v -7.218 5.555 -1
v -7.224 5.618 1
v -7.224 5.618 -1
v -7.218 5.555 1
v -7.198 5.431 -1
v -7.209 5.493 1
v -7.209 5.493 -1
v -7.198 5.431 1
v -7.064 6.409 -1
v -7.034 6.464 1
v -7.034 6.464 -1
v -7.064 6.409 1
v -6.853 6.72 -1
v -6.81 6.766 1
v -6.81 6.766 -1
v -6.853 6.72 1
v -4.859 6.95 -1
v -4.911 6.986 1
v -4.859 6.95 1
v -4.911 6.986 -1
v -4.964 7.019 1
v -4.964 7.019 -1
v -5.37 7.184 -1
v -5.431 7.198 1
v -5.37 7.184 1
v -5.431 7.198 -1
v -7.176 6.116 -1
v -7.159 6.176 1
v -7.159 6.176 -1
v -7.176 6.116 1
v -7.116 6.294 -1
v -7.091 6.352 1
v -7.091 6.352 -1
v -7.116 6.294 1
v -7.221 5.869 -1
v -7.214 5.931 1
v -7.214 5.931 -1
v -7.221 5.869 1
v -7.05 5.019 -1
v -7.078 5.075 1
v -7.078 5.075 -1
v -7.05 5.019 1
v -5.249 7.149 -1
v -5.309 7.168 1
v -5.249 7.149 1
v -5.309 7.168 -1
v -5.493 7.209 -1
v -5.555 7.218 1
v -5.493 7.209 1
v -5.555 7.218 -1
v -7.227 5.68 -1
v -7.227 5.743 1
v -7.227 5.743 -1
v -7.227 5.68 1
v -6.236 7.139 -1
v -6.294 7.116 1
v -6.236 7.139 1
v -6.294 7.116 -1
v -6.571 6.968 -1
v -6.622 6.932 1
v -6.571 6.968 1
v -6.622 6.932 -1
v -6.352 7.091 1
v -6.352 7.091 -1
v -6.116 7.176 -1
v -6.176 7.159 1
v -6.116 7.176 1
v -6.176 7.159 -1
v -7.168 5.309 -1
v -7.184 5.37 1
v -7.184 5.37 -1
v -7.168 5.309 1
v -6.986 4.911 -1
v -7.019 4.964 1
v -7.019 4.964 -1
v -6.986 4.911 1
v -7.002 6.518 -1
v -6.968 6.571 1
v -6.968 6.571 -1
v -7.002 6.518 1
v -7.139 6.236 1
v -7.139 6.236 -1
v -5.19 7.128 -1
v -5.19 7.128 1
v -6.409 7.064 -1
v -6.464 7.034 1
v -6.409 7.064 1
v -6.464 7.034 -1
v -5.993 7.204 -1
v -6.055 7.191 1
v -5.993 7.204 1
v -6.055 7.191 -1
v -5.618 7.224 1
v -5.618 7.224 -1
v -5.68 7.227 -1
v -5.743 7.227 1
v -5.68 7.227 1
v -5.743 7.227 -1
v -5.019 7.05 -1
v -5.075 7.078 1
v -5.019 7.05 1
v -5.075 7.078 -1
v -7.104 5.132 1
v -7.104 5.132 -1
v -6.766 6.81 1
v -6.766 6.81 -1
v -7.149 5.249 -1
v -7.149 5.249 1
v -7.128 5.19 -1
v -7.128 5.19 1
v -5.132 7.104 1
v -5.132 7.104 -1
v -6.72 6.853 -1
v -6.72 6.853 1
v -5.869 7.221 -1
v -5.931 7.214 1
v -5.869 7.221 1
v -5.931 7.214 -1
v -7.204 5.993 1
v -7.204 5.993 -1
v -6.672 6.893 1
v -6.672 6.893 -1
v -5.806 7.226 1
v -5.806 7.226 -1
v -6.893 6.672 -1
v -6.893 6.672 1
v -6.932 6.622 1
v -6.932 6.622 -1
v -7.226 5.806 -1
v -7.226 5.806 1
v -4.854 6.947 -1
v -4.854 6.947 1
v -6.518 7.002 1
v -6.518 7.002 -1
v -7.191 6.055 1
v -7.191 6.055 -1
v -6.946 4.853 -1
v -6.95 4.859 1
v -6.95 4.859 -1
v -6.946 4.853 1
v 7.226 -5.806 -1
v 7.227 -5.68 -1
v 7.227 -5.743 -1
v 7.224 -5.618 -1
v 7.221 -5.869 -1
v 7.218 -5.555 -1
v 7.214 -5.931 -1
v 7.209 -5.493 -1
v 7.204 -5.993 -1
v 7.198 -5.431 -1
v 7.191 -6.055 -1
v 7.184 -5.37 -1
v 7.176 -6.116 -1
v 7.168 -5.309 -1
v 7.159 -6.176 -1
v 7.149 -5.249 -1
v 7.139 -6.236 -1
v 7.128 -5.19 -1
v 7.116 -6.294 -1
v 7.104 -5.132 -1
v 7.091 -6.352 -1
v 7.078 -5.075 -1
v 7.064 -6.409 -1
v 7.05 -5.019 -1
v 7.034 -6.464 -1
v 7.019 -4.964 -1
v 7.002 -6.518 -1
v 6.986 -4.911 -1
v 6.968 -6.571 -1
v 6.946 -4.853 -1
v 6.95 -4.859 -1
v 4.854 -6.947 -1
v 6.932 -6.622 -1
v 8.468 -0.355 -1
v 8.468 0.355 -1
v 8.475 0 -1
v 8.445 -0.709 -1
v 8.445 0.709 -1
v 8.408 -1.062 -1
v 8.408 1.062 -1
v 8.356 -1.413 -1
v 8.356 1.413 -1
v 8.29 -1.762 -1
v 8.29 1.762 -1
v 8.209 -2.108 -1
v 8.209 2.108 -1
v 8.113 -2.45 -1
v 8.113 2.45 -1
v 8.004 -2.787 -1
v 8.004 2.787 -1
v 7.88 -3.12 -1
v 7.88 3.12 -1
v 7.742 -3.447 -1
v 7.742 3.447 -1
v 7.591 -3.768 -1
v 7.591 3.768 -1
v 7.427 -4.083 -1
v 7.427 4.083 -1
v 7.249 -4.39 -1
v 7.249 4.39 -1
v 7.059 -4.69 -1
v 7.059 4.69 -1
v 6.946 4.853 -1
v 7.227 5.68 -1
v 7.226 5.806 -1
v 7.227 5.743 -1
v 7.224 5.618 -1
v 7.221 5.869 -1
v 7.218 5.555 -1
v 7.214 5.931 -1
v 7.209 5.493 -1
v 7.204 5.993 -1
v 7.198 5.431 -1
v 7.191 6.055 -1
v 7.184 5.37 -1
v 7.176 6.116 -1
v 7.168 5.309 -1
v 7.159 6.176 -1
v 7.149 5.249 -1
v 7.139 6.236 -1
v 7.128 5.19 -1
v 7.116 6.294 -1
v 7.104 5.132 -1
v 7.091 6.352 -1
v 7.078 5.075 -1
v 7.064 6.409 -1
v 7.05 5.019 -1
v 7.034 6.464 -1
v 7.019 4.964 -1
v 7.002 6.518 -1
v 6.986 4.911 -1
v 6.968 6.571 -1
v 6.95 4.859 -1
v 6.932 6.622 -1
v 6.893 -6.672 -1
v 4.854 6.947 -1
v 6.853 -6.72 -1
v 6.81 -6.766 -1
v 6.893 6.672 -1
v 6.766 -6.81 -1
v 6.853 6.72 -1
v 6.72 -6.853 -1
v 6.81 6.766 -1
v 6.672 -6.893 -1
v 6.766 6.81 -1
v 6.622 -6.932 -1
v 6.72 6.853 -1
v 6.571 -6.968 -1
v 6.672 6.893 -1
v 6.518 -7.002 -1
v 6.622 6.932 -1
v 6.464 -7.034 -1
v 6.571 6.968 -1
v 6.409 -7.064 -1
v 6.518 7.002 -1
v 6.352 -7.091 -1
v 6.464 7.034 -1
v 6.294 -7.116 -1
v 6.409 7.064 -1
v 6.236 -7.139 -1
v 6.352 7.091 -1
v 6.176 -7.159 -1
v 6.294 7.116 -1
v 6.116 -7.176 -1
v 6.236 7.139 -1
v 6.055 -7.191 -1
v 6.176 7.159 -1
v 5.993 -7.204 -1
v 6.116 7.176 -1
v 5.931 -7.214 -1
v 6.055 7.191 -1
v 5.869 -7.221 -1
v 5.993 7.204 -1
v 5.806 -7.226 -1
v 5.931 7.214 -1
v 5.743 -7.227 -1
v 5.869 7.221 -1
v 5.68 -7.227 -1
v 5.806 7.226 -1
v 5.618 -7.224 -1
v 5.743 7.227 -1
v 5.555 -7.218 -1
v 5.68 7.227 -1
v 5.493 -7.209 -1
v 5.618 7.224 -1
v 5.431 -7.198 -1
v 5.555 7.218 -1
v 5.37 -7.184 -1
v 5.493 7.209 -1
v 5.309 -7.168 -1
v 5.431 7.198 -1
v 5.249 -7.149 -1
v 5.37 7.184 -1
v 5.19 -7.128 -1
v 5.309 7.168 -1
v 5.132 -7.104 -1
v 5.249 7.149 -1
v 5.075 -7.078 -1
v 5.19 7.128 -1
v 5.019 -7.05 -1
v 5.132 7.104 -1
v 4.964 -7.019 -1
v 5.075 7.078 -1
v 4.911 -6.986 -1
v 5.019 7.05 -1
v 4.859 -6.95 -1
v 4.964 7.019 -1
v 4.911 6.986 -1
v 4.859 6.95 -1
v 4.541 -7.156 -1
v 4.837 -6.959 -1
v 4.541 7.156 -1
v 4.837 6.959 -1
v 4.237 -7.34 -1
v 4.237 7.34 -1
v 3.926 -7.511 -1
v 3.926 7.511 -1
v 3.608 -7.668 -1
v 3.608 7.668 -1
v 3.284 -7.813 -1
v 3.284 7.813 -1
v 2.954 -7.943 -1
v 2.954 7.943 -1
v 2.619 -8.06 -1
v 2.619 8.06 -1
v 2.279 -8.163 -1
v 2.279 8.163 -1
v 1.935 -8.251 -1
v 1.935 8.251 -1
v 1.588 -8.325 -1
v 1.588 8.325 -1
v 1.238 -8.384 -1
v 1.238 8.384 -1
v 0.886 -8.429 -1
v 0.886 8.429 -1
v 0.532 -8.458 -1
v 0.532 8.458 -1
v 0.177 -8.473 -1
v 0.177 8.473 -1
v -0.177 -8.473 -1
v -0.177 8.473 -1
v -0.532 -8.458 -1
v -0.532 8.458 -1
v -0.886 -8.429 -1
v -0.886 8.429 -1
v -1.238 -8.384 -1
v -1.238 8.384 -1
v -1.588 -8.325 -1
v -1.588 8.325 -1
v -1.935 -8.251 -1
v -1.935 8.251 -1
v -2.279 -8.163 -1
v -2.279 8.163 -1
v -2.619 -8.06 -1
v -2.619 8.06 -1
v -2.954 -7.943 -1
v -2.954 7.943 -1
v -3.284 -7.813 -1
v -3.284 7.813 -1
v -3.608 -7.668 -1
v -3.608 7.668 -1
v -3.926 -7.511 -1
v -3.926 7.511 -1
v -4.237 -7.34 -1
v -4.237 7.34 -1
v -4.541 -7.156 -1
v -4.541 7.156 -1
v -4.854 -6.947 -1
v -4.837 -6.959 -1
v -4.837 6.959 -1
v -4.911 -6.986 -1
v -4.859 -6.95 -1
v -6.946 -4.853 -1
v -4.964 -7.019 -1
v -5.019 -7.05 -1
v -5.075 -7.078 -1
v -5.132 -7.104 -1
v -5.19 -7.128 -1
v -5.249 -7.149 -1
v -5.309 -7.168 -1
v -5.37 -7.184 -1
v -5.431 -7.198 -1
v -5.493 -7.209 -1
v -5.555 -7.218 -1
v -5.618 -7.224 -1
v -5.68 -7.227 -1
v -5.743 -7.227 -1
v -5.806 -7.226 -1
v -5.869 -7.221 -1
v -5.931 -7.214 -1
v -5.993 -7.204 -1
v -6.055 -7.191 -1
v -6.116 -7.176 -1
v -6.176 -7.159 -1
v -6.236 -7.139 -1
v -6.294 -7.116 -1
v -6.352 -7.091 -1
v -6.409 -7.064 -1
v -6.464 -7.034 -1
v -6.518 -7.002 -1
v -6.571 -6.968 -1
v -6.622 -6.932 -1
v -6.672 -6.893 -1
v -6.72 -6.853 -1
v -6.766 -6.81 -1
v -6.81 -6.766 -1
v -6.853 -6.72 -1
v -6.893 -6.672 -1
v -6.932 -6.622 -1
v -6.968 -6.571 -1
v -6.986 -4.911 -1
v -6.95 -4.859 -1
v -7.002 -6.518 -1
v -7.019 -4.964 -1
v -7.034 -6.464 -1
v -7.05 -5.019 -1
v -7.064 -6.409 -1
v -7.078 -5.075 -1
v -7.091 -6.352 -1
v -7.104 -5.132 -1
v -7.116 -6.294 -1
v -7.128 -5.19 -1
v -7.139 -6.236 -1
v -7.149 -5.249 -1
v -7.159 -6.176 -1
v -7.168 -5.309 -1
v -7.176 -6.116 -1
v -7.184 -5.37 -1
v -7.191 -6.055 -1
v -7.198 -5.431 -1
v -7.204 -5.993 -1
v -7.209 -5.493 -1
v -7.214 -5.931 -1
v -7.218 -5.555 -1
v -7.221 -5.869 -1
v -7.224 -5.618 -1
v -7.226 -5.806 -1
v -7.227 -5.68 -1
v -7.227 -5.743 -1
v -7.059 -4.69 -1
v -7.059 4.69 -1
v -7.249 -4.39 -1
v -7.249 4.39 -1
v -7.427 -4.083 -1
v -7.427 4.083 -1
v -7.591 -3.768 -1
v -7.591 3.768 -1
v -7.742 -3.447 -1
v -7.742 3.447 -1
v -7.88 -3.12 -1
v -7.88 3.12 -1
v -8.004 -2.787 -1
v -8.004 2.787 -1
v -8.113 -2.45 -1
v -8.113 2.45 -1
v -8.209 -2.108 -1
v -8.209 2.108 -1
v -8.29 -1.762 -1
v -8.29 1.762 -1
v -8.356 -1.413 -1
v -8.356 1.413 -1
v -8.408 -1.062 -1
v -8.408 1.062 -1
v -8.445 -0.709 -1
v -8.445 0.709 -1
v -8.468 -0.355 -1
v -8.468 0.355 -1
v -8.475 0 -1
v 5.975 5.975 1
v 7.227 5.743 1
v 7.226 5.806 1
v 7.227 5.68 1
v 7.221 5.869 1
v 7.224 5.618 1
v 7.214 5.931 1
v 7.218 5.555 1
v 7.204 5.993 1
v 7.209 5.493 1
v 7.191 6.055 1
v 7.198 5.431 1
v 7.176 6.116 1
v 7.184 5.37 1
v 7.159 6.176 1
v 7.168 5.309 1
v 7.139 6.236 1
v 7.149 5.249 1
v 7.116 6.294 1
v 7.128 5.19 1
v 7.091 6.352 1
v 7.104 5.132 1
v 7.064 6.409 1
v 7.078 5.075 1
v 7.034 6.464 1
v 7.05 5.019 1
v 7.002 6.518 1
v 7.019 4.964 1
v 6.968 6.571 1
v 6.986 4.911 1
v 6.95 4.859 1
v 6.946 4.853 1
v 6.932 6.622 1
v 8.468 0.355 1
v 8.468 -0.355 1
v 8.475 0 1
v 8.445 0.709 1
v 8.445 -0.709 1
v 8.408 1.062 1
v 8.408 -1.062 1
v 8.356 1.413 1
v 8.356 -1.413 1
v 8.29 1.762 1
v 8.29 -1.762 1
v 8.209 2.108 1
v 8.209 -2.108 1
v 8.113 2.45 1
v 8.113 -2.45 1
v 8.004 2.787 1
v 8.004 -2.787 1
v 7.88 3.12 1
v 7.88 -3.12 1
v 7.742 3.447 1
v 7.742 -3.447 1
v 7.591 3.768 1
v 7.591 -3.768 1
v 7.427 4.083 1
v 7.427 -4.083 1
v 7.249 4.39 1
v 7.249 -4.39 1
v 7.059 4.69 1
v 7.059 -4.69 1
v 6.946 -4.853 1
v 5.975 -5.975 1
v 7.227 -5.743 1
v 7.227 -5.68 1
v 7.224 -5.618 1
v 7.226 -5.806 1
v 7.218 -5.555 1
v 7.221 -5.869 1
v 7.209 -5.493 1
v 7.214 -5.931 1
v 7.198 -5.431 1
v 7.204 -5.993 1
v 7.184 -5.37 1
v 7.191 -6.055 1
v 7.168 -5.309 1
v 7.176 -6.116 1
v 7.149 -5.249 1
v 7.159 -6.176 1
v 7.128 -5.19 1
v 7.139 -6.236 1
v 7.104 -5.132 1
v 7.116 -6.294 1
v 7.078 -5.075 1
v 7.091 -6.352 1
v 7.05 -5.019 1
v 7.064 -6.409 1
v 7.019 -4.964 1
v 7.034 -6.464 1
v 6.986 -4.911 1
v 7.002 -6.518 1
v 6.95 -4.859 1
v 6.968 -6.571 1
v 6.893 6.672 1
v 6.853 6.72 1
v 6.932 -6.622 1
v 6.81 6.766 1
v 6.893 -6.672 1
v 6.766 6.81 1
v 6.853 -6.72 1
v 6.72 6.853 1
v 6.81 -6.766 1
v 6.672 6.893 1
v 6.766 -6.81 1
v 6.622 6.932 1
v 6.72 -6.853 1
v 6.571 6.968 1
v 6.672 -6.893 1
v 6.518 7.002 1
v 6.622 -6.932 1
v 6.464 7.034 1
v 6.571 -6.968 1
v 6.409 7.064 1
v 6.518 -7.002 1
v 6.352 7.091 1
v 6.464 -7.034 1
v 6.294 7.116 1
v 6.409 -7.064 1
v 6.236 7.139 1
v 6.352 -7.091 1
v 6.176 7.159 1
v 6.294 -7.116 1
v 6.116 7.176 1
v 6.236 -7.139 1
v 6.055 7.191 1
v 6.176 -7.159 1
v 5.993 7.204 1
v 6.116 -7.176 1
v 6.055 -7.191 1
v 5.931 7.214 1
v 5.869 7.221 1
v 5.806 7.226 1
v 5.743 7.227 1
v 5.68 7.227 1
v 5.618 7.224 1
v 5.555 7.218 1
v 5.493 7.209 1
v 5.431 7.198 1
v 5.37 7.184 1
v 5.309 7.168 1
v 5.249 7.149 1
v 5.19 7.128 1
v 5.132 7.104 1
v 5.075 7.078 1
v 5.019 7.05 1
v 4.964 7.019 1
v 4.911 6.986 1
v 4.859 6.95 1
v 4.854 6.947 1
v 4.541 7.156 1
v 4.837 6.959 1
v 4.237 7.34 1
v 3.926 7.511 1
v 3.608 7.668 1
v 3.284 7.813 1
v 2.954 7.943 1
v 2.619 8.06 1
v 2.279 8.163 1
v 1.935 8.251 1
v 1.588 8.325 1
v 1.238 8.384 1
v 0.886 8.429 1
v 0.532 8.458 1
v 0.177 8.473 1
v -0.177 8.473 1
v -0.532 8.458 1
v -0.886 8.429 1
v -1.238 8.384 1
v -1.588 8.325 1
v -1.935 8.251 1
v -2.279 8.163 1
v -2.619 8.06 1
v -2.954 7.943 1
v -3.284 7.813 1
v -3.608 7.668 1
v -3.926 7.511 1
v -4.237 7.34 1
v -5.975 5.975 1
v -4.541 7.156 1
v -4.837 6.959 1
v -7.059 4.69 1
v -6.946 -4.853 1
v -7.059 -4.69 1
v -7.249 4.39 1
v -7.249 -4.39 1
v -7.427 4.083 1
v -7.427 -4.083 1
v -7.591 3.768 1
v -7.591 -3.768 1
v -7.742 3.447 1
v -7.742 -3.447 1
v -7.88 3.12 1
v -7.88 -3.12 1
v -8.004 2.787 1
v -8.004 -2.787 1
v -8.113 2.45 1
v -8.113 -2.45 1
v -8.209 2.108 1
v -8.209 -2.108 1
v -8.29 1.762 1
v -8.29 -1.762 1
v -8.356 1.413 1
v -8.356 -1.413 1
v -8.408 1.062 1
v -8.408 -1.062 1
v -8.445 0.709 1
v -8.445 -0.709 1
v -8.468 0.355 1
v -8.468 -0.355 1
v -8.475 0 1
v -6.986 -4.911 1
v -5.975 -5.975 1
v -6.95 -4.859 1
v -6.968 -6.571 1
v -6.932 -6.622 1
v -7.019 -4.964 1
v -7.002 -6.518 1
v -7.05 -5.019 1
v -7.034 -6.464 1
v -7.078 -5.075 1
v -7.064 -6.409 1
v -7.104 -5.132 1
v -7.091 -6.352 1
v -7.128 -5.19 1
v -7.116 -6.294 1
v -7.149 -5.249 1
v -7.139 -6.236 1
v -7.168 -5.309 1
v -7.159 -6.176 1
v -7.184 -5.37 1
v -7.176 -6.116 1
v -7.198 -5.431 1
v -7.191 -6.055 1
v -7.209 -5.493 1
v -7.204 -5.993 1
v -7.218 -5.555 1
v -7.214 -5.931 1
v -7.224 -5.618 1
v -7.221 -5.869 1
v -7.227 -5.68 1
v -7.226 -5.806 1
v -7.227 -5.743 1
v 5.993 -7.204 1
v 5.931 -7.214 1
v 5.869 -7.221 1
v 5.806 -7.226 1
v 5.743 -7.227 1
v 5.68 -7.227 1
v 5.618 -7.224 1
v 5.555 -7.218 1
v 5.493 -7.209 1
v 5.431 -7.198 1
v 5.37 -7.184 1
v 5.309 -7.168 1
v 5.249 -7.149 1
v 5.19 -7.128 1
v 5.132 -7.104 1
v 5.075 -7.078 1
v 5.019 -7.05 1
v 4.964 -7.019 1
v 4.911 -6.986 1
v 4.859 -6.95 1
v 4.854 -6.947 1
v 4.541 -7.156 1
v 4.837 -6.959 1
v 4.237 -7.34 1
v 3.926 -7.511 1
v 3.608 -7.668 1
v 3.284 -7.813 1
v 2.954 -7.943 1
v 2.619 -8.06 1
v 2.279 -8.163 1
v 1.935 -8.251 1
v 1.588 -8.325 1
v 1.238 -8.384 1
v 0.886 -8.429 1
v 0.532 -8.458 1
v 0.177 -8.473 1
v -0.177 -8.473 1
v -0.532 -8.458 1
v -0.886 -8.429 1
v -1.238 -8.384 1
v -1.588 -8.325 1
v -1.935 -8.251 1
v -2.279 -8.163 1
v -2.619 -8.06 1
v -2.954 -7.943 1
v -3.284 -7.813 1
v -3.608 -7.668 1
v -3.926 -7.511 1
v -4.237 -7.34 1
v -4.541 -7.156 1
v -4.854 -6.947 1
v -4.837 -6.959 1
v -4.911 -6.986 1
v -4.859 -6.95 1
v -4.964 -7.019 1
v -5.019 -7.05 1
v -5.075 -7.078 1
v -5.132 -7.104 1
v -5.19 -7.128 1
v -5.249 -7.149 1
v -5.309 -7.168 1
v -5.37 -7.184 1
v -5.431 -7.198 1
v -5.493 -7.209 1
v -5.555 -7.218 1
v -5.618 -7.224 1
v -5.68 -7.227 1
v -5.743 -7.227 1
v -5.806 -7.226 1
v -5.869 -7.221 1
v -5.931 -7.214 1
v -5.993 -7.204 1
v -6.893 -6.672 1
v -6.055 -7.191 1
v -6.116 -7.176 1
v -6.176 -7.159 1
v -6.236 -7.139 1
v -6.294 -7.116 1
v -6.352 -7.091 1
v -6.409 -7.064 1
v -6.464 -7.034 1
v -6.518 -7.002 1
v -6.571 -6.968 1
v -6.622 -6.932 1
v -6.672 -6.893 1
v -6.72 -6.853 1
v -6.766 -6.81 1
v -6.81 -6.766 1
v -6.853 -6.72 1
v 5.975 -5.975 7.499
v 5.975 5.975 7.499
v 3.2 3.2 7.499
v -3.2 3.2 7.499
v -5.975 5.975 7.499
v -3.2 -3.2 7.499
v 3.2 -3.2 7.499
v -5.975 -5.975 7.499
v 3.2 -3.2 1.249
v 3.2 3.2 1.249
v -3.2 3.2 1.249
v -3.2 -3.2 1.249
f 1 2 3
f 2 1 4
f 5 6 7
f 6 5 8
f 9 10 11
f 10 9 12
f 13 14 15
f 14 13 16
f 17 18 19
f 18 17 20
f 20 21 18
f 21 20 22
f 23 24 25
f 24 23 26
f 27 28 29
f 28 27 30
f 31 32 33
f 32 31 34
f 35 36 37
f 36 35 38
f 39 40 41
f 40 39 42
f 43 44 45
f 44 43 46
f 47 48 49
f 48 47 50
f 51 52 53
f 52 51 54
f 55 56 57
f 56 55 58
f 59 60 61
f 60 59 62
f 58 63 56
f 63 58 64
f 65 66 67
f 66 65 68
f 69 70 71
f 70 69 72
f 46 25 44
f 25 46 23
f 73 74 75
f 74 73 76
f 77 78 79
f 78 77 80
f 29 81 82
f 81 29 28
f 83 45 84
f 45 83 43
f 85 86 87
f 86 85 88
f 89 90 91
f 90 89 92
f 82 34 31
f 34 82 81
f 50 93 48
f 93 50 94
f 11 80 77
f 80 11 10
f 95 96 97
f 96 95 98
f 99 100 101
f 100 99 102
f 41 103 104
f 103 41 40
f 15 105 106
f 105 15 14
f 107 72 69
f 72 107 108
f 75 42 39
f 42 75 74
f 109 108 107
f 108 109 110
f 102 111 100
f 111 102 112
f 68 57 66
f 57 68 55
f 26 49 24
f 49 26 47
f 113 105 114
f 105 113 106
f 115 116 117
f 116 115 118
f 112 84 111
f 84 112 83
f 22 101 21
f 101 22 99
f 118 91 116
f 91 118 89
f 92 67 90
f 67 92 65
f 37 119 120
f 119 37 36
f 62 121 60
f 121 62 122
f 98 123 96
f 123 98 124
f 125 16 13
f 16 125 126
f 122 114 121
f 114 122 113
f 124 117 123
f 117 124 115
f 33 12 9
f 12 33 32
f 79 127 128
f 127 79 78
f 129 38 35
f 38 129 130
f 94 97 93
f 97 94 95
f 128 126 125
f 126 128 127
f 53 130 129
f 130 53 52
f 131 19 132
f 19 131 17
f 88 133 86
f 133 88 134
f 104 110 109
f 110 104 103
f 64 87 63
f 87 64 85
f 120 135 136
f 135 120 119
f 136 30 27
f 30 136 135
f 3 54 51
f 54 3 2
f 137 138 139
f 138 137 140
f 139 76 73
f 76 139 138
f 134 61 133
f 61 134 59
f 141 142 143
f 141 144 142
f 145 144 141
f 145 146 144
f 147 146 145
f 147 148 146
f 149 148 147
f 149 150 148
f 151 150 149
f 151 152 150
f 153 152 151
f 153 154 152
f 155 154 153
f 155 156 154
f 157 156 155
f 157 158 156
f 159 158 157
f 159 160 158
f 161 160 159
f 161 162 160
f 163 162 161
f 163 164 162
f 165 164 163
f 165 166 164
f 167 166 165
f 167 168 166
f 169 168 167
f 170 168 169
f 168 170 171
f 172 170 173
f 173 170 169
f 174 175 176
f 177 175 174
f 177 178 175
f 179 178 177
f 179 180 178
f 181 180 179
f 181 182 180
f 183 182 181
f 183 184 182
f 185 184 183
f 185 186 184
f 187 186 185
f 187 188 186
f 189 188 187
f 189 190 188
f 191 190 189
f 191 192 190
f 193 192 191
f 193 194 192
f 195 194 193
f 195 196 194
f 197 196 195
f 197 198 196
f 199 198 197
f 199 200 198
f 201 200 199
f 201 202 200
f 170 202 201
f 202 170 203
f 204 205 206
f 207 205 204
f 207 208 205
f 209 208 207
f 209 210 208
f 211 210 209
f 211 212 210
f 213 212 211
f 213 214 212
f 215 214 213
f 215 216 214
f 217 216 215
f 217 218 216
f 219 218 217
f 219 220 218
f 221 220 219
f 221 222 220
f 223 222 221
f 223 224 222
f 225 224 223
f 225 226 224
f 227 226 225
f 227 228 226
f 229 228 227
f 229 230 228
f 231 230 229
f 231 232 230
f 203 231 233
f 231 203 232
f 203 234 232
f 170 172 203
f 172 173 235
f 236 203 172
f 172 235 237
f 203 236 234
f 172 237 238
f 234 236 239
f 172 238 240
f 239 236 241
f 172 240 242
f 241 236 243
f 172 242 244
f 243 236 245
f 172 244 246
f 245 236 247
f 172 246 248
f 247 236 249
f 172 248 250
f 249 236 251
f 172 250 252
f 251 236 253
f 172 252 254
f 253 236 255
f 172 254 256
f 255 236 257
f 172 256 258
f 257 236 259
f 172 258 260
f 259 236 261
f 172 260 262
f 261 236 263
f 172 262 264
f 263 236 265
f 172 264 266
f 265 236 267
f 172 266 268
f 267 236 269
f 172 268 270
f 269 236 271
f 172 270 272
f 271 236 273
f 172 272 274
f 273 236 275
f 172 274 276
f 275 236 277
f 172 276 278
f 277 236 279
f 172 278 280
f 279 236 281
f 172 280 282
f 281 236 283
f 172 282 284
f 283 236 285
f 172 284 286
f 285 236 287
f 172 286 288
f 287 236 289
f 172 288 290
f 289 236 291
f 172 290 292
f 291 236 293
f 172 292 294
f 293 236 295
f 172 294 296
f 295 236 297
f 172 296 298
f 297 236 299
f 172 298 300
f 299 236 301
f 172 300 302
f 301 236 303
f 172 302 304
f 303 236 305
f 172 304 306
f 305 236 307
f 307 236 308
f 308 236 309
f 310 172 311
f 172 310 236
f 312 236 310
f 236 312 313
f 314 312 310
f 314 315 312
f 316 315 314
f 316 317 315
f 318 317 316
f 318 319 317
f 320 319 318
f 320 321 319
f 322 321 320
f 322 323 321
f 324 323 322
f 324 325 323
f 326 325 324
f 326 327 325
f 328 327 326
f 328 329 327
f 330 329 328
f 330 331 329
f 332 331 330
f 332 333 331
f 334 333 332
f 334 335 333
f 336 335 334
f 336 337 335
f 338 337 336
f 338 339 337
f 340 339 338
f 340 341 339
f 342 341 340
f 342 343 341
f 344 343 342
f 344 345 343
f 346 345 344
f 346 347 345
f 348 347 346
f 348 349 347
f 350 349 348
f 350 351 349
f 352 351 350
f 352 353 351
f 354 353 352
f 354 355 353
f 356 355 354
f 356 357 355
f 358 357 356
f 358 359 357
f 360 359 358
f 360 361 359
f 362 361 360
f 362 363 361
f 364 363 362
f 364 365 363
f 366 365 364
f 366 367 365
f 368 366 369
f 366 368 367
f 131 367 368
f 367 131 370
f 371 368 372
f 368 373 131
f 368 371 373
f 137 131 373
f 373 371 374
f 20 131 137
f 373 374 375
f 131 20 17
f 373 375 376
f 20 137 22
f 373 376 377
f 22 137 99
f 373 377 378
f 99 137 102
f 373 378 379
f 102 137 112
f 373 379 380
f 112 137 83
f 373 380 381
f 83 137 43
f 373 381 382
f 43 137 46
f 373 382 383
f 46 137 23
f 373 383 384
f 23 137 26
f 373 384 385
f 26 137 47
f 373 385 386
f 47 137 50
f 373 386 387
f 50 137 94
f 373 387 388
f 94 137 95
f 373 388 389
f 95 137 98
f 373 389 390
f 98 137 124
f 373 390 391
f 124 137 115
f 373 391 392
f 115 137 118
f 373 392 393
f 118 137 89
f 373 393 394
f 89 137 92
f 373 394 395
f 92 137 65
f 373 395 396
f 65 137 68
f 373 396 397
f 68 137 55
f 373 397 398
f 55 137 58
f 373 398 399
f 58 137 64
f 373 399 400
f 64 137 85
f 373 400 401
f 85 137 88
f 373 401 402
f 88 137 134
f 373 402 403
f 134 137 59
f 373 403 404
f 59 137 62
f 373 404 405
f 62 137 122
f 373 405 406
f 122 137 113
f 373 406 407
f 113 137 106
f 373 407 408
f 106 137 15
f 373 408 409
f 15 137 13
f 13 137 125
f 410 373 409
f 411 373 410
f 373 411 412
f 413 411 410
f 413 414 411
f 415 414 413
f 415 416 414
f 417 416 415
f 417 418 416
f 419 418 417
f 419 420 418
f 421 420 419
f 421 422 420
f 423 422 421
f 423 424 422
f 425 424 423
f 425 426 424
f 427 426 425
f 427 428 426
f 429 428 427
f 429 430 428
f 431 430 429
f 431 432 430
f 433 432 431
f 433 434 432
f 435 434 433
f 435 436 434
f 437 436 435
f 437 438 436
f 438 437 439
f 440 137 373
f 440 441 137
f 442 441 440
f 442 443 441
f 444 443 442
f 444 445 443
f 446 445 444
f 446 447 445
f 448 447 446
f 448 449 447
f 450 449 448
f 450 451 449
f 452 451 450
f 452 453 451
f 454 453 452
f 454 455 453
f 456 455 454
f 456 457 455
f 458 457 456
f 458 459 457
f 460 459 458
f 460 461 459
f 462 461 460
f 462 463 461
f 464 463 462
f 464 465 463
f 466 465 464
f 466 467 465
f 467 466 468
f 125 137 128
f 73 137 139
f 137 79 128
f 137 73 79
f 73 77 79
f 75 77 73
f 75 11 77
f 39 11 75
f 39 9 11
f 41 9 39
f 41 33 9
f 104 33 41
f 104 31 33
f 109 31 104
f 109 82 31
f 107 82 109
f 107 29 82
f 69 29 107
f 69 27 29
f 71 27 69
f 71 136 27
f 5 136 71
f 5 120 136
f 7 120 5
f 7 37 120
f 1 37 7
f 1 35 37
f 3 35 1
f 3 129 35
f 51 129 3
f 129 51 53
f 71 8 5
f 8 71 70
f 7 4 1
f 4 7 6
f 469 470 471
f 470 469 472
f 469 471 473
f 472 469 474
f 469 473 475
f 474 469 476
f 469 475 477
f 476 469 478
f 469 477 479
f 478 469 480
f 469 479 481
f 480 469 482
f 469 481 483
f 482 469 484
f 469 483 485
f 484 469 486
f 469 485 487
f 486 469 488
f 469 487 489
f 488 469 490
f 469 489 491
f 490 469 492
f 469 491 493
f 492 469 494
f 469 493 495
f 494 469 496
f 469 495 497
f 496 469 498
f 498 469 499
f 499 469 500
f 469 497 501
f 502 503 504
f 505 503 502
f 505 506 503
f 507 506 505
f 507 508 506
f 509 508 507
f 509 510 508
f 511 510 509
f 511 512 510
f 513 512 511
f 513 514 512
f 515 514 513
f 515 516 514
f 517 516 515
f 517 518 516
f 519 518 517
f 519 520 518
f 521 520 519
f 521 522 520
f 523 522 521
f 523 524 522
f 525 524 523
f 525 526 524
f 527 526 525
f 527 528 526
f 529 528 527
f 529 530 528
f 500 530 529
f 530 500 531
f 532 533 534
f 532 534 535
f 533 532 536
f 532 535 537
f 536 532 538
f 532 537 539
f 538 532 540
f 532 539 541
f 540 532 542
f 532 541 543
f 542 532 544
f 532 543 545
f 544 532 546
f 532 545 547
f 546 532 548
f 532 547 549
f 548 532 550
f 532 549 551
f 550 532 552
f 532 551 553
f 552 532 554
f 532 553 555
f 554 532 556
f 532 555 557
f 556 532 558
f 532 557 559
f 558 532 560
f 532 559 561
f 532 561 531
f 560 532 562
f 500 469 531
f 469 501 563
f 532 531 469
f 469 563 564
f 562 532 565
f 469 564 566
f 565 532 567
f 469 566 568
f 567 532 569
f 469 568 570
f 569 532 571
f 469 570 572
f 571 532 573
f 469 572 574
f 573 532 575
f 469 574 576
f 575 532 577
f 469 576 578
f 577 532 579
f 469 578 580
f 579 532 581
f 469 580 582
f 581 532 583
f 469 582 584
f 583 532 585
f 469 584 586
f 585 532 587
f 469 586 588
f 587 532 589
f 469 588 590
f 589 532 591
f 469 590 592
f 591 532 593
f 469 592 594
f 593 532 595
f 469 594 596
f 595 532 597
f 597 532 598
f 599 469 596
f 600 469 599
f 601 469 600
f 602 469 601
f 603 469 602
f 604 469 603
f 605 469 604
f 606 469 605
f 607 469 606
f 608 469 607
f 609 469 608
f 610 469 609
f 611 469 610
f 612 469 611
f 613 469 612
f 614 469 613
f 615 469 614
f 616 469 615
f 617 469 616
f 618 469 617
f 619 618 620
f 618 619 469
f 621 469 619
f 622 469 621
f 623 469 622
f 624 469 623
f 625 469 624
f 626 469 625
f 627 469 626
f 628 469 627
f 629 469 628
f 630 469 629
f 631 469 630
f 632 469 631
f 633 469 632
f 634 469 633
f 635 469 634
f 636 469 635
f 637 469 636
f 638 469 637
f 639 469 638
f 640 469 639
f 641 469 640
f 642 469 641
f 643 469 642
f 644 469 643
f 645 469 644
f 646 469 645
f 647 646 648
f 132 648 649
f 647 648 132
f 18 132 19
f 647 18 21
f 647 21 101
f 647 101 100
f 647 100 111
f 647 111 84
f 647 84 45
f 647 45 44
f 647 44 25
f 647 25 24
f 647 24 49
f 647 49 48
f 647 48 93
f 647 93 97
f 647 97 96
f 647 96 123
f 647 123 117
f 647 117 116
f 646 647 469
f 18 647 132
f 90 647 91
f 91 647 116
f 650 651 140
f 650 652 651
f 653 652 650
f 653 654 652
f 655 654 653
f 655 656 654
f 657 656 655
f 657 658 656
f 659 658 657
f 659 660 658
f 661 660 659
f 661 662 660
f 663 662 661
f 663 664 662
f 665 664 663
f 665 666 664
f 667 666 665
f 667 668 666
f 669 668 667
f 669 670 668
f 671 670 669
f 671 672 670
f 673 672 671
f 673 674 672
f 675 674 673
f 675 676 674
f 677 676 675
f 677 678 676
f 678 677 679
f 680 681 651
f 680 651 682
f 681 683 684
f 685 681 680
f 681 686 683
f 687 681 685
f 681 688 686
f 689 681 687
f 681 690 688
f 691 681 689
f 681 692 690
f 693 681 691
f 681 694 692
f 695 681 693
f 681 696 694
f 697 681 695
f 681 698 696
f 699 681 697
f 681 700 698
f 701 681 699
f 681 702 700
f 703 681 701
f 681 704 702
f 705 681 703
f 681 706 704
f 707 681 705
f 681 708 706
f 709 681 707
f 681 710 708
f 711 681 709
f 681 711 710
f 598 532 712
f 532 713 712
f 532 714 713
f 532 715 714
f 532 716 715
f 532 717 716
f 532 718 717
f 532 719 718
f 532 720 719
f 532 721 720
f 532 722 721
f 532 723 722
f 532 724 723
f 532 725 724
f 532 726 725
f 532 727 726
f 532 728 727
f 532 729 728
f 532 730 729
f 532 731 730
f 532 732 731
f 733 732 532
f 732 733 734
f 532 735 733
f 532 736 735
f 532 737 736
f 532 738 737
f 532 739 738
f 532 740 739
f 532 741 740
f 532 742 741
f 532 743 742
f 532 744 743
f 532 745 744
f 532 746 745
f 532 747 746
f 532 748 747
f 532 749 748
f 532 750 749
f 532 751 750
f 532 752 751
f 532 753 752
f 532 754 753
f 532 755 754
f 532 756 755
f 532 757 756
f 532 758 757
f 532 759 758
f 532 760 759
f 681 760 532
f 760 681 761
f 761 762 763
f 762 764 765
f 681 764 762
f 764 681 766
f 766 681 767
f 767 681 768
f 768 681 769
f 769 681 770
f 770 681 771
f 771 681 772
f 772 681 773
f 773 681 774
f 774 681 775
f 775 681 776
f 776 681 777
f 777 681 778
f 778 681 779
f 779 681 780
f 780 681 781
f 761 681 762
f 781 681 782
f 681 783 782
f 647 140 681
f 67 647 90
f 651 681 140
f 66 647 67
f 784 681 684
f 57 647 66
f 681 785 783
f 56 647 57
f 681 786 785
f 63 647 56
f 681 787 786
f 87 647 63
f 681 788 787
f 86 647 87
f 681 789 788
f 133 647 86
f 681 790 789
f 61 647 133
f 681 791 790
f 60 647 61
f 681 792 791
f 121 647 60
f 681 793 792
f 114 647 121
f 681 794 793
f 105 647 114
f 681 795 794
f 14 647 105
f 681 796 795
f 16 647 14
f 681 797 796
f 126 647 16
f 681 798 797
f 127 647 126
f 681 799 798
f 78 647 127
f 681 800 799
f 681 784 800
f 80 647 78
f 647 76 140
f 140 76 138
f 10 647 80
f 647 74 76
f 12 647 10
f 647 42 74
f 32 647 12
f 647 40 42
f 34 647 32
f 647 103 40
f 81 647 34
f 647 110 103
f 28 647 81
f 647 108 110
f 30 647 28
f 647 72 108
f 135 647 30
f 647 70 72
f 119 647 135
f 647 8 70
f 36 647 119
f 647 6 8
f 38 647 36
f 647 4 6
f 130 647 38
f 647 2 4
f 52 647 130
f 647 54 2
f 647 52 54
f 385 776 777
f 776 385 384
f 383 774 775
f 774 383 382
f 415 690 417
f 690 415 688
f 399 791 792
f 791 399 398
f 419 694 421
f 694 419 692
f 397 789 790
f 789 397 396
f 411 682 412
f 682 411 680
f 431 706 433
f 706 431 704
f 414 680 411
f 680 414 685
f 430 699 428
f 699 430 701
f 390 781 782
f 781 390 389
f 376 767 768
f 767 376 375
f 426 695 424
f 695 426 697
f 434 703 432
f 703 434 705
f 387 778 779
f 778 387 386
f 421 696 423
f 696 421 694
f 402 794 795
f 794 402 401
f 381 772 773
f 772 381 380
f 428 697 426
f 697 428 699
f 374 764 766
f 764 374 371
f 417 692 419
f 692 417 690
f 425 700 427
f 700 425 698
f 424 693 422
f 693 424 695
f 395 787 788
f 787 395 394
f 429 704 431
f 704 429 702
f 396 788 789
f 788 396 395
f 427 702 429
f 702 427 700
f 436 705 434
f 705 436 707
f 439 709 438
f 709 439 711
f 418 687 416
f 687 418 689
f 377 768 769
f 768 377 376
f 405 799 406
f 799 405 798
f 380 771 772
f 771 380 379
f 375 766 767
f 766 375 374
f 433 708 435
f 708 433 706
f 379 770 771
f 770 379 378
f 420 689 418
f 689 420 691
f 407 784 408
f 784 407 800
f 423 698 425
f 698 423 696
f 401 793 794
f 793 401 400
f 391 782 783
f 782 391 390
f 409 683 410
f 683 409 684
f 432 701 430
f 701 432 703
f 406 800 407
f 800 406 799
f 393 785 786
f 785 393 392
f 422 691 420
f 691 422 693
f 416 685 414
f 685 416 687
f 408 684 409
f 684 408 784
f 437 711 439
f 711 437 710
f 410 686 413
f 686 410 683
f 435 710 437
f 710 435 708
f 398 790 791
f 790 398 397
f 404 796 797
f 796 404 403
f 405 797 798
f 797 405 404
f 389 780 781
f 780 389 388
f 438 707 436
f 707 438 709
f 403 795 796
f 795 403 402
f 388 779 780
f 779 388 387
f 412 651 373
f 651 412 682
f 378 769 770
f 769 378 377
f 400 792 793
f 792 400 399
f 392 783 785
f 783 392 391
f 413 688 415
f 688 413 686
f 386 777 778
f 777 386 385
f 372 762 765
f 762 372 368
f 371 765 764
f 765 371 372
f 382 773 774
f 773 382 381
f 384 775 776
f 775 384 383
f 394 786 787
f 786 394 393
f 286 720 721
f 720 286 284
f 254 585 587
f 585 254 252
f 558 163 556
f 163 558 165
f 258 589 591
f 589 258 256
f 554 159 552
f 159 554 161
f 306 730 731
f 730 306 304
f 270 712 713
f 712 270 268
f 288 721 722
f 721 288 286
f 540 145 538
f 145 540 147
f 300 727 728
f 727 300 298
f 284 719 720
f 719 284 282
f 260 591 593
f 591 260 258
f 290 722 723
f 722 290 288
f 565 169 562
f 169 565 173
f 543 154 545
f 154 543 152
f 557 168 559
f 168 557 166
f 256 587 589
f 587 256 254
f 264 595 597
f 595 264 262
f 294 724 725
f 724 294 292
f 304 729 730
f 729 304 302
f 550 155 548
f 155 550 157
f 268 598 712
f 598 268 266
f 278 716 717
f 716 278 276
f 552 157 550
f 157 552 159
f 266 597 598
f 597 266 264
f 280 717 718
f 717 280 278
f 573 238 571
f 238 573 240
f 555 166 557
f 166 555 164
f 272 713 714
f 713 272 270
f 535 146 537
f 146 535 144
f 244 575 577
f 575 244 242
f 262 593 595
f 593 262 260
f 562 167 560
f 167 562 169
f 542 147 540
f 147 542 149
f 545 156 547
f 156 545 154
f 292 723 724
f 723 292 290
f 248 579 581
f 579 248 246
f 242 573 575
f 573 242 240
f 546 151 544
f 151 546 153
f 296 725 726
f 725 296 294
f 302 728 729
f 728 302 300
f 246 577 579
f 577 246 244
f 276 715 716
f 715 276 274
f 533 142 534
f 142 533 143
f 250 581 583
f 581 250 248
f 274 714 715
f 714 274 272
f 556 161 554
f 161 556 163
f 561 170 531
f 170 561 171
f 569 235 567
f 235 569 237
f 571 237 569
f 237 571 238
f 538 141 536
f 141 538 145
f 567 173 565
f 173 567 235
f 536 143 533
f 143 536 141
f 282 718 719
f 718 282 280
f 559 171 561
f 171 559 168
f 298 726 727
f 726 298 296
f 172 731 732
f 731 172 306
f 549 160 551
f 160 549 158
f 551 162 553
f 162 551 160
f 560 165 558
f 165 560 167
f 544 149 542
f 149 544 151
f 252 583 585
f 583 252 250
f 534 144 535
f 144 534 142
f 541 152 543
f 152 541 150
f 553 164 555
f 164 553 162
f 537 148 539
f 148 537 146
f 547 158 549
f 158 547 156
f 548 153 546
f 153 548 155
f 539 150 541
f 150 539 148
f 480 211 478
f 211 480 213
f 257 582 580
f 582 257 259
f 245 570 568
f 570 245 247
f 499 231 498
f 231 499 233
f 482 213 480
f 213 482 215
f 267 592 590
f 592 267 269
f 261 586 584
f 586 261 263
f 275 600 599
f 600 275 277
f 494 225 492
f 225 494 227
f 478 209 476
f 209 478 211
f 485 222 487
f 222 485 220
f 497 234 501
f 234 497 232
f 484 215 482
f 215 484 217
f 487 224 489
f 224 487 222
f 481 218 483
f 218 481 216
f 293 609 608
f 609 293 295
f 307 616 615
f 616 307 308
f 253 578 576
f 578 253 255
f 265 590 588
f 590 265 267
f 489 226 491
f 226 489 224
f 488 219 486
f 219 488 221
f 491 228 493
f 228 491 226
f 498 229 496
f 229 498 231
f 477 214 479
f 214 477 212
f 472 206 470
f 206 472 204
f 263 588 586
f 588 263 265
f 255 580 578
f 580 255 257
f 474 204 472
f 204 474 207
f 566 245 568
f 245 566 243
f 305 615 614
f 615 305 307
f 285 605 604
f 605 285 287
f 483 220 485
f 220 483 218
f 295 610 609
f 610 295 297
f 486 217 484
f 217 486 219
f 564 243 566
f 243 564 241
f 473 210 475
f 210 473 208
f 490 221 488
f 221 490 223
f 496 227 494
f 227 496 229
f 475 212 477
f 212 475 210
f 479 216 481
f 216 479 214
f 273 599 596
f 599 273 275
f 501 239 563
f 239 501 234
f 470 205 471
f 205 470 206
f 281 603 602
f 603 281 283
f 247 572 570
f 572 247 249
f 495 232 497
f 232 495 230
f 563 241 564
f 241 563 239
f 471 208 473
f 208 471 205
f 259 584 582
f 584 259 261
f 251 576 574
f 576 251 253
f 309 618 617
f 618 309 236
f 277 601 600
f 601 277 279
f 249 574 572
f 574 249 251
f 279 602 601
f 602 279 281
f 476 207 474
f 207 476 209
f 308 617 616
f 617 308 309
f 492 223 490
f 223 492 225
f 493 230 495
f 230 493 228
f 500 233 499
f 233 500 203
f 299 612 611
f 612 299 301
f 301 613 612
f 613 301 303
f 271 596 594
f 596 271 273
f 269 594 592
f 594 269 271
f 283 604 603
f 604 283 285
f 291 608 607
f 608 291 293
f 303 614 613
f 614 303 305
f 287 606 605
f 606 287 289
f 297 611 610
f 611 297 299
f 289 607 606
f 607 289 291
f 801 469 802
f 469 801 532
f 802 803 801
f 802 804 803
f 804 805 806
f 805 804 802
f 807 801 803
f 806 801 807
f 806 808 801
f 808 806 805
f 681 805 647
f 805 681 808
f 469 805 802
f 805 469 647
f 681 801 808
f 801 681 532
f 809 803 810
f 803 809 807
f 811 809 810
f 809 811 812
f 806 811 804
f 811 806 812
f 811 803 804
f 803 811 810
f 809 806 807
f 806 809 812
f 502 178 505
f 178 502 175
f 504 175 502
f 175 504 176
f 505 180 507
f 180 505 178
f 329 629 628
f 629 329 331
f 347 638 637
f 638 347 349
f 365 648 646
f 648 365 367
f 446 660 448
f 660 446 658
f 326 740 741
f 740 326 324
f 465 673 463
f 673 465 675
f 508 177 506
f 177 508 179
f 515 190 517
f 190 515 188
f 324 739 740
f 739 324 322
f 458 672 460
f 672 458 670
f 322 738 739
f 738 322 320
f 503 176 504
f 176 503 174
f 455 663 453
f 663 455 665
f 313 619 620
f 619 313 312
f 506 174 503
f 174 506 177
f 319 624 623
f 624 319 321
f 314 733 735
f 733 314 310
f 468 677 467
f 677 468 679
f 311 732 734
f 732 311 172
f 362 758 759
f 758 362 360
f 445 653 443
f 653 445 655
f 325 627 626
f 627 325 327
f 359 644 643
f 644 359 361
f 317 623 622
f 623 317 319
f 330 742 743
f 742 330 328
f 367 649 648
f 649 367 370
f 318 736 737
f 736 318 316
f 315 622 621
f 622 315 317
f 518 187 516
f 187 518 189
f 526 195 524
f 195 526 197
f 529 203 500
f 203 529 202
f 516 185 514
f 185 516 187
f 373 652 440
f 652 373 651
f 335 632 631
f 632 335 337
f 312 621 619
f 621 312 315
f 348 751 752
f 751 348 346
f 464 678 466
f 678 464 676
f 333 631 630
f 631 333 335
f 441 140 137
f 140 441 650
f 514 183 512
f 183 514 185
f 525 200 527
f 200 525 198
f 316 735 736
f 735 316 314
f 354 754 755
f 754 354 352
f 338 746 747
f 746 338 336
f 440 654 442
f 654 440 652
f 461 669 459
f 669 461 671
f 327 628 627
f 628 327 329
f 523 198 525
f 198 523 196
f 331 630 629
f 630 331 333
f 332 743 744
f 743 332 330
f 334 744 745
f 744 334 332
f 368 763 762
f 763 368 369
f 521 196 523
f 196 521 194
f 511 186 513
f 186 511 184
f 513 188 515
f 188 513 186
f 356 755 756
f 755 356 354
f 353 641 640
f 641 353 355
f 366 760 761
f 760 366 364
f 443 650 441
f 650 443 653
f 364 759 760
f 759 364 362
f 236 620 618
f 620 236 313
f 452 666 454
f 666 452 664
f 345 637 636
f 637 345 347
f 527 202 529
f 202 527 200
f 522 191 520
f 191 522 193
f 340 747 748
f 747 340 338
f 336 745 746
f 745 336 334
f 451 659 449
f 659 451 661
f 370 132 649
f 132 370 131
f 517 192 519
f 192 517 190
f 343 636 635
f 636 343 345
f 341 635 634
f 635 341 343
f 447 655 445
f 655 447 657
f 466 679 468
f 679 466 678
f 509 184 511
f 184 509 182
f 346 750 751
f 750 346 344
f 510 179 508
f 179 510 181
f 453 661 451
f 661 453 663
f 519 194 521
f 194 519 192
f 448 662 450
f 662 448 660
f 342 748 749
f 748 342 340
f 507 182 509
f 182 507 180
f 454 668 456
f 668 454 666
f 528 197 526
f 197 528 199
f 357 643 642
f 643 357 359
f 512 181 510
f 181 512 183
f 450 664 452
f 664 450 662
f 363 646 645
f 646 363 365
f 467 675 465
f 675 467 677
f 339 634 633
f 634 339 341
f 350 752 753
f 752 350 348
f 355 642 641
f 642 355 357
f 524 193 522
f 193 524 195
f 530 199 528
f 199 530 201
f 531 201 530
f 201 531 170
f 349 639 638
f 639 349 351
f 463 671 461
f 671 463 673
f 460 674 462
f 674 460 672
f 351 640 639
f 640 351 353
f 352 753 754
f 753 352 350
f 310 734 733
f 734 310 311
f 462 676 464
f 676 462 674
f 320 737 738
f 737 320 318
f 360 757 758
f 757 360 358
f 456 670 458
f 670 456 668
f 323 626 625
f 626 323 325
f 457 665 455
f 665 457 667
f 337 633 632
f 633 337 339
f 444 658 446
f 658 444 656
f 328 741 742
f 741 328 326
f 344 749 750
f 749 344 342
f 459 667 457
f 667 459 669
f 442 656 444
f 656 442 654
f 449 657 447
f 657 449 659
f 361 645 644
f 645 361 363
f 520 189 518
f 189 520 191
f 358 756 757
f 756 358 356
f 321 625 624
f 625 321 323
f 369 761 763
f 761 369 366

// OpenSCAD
// Wurkkos HD10 Bezel Tool
// Version 1.0

$fn = 150;

///////// Variables
// Width of box for wrench
box_outer_width = 11.95; // 12mm wrench
// box_outer_width = 12.65; // 1/2" wrench

main_diameter = 16.95; // mm - diameter of big cylinder
wing_radius = 1.5; // mm - radius of smaller cylinders
wing_offset = (main_diameter / 2) - (0.25 * wing_radius); // offset inward slightly
main_height = 2.0; // mm - height of cylinder and wings

box_inner_width = 6.4; // mm for 1/4 ratchet
box_height = 6.5; // mm
box_z_offset = (main_height / 2) + (box_height / 2);

///////// Code
// Main cylinder
cylinder(h = main_height, d = main_diameter, center = true);

// Wing circles
for (i = [0:3]) {
    rotate([0, 0, (i * 90) + 45]) {
        translate([0, wing_offset, 0]) {
            cylinder(h = main_height, r = wing_radius, center = true);
        }
    }
}

// Box for wrench
translate([0, 0, box_z_offset-0.001]) { // offset to make sure they form one object
    difference() {
        cube(size = [box_outer_width, box_outer_width, box_height], center = true);
        translate([0, 0, .25]) {
            cube(size = [box_inner_width, box_inner_width, box_height], center = true);
        }
    }
}
